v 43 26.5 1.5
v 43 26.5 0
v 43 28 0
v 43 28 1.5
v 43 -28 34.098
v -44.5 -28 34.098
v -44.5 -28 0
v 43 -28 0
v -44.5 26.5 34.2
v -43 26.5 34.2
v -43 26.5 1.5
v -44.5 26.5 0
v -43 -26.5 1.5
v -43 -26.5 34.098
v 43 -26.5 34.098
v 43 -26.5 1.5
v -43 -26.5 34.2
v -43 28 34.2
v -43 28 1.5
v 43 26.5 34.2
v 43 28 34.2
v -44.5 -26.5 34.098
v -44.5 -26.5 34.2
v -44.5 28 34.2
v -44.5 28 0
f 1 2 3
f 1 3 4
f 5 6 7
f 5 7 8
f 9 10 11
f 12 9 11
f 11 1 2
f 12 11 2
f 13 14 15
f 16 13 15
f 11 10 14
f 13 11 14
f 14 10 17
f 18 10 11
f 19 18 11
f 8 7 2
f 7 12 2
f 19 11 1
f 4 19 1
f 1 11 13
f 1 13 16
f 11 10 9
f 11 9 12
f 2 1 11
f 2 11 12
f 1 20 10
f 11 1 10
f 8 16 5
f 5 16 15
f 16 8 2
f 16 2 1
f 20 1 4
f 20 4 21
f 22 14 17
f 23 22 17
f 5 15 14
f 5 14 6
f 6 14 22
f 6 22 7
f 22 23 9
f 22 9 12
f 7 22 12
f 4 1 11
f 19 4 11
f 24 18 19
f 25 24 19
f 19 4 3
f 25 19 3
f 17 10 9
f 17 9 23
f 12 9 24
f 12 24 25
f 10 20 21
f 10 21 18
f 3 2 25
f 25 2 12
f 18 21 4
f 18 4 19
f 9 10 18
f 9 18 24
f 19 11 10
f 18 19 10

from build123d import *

# Parameters (mm, degrees)
F0_W     = 86
F0_H     = 53
F1_DEPTH = 1.5
F2_W     = 53
F2_H     = 32.7
F2_H_2   = 1.5
F3_DEPTH = 1.5
F4_W     = 86
F4_H     = 32.7
F5_DEPTH = 1.5
F6_DEPTH = 1.5
F7_W     = 86
F7_H     = 32.5979471803
F8_DEPTH = 1.5


with BuildPart() as f1:
    # F0 (on Top) → F1 (new body)
    with BuildSketch(Plane.XY):
        Rectangle(F0_W, F0_H)
    extrude(amount=F1_DEPTH)

    # F2 (on face) → F3 (join)
    with BuildSketch(Plane(origin=(-43, 0, 0), x_dir=(0, -1, 0), z_dir=(-1, 0, 0))):
        with Locations((0, 17.85)):
            Rectangle(F2_W, F2_H)
        with Locations((0, 0.75)):
            Rectangle(F2_W, F2_H_2)
    extrude(amount=F3_DEPTH)


with BuildPart() as f5:
    # F4 (on face) → F5 (new body)
    with BuildSketch(Plane(origin=(0, 26.5, 0), x_dir=(-1, 0, 0), z_dir=(0, 1, 0))):
        with Locations((0, 17.85)):
            Rectangle(F4_W, F4_H)
    extrude(amount=F5_DEPTH)


with BuildPart() as f6:
    # F6 (new): a face of the model
    f6_faces = [f1.part.faces().sort_by_distance(p)[0] for p in [
        (42.0605379199, 26.5, 0.75),
    ]]
    extrude(f6_faces, amount=F6_DEPTH)


with BuildPart() as f1_1:
    add(f1.part)

    # F7 (on face) → F8 (join)
    with BuildSketch(Plane.XZ.offset(26.5)):
        with Locations((0, 17.7989735901)):
            Rectangle(F7_W, F7_H)
        Polygon((-44.5, 34.0979471803), (-44.5, 0), (43, 0), (43, 1.5), (-43, 1.5), (-43, 34.0979471803), align=None)
    extrude(amount=F8_DEPTH)


solid = Compound([f5.part, f6.part, f1_1.part])
